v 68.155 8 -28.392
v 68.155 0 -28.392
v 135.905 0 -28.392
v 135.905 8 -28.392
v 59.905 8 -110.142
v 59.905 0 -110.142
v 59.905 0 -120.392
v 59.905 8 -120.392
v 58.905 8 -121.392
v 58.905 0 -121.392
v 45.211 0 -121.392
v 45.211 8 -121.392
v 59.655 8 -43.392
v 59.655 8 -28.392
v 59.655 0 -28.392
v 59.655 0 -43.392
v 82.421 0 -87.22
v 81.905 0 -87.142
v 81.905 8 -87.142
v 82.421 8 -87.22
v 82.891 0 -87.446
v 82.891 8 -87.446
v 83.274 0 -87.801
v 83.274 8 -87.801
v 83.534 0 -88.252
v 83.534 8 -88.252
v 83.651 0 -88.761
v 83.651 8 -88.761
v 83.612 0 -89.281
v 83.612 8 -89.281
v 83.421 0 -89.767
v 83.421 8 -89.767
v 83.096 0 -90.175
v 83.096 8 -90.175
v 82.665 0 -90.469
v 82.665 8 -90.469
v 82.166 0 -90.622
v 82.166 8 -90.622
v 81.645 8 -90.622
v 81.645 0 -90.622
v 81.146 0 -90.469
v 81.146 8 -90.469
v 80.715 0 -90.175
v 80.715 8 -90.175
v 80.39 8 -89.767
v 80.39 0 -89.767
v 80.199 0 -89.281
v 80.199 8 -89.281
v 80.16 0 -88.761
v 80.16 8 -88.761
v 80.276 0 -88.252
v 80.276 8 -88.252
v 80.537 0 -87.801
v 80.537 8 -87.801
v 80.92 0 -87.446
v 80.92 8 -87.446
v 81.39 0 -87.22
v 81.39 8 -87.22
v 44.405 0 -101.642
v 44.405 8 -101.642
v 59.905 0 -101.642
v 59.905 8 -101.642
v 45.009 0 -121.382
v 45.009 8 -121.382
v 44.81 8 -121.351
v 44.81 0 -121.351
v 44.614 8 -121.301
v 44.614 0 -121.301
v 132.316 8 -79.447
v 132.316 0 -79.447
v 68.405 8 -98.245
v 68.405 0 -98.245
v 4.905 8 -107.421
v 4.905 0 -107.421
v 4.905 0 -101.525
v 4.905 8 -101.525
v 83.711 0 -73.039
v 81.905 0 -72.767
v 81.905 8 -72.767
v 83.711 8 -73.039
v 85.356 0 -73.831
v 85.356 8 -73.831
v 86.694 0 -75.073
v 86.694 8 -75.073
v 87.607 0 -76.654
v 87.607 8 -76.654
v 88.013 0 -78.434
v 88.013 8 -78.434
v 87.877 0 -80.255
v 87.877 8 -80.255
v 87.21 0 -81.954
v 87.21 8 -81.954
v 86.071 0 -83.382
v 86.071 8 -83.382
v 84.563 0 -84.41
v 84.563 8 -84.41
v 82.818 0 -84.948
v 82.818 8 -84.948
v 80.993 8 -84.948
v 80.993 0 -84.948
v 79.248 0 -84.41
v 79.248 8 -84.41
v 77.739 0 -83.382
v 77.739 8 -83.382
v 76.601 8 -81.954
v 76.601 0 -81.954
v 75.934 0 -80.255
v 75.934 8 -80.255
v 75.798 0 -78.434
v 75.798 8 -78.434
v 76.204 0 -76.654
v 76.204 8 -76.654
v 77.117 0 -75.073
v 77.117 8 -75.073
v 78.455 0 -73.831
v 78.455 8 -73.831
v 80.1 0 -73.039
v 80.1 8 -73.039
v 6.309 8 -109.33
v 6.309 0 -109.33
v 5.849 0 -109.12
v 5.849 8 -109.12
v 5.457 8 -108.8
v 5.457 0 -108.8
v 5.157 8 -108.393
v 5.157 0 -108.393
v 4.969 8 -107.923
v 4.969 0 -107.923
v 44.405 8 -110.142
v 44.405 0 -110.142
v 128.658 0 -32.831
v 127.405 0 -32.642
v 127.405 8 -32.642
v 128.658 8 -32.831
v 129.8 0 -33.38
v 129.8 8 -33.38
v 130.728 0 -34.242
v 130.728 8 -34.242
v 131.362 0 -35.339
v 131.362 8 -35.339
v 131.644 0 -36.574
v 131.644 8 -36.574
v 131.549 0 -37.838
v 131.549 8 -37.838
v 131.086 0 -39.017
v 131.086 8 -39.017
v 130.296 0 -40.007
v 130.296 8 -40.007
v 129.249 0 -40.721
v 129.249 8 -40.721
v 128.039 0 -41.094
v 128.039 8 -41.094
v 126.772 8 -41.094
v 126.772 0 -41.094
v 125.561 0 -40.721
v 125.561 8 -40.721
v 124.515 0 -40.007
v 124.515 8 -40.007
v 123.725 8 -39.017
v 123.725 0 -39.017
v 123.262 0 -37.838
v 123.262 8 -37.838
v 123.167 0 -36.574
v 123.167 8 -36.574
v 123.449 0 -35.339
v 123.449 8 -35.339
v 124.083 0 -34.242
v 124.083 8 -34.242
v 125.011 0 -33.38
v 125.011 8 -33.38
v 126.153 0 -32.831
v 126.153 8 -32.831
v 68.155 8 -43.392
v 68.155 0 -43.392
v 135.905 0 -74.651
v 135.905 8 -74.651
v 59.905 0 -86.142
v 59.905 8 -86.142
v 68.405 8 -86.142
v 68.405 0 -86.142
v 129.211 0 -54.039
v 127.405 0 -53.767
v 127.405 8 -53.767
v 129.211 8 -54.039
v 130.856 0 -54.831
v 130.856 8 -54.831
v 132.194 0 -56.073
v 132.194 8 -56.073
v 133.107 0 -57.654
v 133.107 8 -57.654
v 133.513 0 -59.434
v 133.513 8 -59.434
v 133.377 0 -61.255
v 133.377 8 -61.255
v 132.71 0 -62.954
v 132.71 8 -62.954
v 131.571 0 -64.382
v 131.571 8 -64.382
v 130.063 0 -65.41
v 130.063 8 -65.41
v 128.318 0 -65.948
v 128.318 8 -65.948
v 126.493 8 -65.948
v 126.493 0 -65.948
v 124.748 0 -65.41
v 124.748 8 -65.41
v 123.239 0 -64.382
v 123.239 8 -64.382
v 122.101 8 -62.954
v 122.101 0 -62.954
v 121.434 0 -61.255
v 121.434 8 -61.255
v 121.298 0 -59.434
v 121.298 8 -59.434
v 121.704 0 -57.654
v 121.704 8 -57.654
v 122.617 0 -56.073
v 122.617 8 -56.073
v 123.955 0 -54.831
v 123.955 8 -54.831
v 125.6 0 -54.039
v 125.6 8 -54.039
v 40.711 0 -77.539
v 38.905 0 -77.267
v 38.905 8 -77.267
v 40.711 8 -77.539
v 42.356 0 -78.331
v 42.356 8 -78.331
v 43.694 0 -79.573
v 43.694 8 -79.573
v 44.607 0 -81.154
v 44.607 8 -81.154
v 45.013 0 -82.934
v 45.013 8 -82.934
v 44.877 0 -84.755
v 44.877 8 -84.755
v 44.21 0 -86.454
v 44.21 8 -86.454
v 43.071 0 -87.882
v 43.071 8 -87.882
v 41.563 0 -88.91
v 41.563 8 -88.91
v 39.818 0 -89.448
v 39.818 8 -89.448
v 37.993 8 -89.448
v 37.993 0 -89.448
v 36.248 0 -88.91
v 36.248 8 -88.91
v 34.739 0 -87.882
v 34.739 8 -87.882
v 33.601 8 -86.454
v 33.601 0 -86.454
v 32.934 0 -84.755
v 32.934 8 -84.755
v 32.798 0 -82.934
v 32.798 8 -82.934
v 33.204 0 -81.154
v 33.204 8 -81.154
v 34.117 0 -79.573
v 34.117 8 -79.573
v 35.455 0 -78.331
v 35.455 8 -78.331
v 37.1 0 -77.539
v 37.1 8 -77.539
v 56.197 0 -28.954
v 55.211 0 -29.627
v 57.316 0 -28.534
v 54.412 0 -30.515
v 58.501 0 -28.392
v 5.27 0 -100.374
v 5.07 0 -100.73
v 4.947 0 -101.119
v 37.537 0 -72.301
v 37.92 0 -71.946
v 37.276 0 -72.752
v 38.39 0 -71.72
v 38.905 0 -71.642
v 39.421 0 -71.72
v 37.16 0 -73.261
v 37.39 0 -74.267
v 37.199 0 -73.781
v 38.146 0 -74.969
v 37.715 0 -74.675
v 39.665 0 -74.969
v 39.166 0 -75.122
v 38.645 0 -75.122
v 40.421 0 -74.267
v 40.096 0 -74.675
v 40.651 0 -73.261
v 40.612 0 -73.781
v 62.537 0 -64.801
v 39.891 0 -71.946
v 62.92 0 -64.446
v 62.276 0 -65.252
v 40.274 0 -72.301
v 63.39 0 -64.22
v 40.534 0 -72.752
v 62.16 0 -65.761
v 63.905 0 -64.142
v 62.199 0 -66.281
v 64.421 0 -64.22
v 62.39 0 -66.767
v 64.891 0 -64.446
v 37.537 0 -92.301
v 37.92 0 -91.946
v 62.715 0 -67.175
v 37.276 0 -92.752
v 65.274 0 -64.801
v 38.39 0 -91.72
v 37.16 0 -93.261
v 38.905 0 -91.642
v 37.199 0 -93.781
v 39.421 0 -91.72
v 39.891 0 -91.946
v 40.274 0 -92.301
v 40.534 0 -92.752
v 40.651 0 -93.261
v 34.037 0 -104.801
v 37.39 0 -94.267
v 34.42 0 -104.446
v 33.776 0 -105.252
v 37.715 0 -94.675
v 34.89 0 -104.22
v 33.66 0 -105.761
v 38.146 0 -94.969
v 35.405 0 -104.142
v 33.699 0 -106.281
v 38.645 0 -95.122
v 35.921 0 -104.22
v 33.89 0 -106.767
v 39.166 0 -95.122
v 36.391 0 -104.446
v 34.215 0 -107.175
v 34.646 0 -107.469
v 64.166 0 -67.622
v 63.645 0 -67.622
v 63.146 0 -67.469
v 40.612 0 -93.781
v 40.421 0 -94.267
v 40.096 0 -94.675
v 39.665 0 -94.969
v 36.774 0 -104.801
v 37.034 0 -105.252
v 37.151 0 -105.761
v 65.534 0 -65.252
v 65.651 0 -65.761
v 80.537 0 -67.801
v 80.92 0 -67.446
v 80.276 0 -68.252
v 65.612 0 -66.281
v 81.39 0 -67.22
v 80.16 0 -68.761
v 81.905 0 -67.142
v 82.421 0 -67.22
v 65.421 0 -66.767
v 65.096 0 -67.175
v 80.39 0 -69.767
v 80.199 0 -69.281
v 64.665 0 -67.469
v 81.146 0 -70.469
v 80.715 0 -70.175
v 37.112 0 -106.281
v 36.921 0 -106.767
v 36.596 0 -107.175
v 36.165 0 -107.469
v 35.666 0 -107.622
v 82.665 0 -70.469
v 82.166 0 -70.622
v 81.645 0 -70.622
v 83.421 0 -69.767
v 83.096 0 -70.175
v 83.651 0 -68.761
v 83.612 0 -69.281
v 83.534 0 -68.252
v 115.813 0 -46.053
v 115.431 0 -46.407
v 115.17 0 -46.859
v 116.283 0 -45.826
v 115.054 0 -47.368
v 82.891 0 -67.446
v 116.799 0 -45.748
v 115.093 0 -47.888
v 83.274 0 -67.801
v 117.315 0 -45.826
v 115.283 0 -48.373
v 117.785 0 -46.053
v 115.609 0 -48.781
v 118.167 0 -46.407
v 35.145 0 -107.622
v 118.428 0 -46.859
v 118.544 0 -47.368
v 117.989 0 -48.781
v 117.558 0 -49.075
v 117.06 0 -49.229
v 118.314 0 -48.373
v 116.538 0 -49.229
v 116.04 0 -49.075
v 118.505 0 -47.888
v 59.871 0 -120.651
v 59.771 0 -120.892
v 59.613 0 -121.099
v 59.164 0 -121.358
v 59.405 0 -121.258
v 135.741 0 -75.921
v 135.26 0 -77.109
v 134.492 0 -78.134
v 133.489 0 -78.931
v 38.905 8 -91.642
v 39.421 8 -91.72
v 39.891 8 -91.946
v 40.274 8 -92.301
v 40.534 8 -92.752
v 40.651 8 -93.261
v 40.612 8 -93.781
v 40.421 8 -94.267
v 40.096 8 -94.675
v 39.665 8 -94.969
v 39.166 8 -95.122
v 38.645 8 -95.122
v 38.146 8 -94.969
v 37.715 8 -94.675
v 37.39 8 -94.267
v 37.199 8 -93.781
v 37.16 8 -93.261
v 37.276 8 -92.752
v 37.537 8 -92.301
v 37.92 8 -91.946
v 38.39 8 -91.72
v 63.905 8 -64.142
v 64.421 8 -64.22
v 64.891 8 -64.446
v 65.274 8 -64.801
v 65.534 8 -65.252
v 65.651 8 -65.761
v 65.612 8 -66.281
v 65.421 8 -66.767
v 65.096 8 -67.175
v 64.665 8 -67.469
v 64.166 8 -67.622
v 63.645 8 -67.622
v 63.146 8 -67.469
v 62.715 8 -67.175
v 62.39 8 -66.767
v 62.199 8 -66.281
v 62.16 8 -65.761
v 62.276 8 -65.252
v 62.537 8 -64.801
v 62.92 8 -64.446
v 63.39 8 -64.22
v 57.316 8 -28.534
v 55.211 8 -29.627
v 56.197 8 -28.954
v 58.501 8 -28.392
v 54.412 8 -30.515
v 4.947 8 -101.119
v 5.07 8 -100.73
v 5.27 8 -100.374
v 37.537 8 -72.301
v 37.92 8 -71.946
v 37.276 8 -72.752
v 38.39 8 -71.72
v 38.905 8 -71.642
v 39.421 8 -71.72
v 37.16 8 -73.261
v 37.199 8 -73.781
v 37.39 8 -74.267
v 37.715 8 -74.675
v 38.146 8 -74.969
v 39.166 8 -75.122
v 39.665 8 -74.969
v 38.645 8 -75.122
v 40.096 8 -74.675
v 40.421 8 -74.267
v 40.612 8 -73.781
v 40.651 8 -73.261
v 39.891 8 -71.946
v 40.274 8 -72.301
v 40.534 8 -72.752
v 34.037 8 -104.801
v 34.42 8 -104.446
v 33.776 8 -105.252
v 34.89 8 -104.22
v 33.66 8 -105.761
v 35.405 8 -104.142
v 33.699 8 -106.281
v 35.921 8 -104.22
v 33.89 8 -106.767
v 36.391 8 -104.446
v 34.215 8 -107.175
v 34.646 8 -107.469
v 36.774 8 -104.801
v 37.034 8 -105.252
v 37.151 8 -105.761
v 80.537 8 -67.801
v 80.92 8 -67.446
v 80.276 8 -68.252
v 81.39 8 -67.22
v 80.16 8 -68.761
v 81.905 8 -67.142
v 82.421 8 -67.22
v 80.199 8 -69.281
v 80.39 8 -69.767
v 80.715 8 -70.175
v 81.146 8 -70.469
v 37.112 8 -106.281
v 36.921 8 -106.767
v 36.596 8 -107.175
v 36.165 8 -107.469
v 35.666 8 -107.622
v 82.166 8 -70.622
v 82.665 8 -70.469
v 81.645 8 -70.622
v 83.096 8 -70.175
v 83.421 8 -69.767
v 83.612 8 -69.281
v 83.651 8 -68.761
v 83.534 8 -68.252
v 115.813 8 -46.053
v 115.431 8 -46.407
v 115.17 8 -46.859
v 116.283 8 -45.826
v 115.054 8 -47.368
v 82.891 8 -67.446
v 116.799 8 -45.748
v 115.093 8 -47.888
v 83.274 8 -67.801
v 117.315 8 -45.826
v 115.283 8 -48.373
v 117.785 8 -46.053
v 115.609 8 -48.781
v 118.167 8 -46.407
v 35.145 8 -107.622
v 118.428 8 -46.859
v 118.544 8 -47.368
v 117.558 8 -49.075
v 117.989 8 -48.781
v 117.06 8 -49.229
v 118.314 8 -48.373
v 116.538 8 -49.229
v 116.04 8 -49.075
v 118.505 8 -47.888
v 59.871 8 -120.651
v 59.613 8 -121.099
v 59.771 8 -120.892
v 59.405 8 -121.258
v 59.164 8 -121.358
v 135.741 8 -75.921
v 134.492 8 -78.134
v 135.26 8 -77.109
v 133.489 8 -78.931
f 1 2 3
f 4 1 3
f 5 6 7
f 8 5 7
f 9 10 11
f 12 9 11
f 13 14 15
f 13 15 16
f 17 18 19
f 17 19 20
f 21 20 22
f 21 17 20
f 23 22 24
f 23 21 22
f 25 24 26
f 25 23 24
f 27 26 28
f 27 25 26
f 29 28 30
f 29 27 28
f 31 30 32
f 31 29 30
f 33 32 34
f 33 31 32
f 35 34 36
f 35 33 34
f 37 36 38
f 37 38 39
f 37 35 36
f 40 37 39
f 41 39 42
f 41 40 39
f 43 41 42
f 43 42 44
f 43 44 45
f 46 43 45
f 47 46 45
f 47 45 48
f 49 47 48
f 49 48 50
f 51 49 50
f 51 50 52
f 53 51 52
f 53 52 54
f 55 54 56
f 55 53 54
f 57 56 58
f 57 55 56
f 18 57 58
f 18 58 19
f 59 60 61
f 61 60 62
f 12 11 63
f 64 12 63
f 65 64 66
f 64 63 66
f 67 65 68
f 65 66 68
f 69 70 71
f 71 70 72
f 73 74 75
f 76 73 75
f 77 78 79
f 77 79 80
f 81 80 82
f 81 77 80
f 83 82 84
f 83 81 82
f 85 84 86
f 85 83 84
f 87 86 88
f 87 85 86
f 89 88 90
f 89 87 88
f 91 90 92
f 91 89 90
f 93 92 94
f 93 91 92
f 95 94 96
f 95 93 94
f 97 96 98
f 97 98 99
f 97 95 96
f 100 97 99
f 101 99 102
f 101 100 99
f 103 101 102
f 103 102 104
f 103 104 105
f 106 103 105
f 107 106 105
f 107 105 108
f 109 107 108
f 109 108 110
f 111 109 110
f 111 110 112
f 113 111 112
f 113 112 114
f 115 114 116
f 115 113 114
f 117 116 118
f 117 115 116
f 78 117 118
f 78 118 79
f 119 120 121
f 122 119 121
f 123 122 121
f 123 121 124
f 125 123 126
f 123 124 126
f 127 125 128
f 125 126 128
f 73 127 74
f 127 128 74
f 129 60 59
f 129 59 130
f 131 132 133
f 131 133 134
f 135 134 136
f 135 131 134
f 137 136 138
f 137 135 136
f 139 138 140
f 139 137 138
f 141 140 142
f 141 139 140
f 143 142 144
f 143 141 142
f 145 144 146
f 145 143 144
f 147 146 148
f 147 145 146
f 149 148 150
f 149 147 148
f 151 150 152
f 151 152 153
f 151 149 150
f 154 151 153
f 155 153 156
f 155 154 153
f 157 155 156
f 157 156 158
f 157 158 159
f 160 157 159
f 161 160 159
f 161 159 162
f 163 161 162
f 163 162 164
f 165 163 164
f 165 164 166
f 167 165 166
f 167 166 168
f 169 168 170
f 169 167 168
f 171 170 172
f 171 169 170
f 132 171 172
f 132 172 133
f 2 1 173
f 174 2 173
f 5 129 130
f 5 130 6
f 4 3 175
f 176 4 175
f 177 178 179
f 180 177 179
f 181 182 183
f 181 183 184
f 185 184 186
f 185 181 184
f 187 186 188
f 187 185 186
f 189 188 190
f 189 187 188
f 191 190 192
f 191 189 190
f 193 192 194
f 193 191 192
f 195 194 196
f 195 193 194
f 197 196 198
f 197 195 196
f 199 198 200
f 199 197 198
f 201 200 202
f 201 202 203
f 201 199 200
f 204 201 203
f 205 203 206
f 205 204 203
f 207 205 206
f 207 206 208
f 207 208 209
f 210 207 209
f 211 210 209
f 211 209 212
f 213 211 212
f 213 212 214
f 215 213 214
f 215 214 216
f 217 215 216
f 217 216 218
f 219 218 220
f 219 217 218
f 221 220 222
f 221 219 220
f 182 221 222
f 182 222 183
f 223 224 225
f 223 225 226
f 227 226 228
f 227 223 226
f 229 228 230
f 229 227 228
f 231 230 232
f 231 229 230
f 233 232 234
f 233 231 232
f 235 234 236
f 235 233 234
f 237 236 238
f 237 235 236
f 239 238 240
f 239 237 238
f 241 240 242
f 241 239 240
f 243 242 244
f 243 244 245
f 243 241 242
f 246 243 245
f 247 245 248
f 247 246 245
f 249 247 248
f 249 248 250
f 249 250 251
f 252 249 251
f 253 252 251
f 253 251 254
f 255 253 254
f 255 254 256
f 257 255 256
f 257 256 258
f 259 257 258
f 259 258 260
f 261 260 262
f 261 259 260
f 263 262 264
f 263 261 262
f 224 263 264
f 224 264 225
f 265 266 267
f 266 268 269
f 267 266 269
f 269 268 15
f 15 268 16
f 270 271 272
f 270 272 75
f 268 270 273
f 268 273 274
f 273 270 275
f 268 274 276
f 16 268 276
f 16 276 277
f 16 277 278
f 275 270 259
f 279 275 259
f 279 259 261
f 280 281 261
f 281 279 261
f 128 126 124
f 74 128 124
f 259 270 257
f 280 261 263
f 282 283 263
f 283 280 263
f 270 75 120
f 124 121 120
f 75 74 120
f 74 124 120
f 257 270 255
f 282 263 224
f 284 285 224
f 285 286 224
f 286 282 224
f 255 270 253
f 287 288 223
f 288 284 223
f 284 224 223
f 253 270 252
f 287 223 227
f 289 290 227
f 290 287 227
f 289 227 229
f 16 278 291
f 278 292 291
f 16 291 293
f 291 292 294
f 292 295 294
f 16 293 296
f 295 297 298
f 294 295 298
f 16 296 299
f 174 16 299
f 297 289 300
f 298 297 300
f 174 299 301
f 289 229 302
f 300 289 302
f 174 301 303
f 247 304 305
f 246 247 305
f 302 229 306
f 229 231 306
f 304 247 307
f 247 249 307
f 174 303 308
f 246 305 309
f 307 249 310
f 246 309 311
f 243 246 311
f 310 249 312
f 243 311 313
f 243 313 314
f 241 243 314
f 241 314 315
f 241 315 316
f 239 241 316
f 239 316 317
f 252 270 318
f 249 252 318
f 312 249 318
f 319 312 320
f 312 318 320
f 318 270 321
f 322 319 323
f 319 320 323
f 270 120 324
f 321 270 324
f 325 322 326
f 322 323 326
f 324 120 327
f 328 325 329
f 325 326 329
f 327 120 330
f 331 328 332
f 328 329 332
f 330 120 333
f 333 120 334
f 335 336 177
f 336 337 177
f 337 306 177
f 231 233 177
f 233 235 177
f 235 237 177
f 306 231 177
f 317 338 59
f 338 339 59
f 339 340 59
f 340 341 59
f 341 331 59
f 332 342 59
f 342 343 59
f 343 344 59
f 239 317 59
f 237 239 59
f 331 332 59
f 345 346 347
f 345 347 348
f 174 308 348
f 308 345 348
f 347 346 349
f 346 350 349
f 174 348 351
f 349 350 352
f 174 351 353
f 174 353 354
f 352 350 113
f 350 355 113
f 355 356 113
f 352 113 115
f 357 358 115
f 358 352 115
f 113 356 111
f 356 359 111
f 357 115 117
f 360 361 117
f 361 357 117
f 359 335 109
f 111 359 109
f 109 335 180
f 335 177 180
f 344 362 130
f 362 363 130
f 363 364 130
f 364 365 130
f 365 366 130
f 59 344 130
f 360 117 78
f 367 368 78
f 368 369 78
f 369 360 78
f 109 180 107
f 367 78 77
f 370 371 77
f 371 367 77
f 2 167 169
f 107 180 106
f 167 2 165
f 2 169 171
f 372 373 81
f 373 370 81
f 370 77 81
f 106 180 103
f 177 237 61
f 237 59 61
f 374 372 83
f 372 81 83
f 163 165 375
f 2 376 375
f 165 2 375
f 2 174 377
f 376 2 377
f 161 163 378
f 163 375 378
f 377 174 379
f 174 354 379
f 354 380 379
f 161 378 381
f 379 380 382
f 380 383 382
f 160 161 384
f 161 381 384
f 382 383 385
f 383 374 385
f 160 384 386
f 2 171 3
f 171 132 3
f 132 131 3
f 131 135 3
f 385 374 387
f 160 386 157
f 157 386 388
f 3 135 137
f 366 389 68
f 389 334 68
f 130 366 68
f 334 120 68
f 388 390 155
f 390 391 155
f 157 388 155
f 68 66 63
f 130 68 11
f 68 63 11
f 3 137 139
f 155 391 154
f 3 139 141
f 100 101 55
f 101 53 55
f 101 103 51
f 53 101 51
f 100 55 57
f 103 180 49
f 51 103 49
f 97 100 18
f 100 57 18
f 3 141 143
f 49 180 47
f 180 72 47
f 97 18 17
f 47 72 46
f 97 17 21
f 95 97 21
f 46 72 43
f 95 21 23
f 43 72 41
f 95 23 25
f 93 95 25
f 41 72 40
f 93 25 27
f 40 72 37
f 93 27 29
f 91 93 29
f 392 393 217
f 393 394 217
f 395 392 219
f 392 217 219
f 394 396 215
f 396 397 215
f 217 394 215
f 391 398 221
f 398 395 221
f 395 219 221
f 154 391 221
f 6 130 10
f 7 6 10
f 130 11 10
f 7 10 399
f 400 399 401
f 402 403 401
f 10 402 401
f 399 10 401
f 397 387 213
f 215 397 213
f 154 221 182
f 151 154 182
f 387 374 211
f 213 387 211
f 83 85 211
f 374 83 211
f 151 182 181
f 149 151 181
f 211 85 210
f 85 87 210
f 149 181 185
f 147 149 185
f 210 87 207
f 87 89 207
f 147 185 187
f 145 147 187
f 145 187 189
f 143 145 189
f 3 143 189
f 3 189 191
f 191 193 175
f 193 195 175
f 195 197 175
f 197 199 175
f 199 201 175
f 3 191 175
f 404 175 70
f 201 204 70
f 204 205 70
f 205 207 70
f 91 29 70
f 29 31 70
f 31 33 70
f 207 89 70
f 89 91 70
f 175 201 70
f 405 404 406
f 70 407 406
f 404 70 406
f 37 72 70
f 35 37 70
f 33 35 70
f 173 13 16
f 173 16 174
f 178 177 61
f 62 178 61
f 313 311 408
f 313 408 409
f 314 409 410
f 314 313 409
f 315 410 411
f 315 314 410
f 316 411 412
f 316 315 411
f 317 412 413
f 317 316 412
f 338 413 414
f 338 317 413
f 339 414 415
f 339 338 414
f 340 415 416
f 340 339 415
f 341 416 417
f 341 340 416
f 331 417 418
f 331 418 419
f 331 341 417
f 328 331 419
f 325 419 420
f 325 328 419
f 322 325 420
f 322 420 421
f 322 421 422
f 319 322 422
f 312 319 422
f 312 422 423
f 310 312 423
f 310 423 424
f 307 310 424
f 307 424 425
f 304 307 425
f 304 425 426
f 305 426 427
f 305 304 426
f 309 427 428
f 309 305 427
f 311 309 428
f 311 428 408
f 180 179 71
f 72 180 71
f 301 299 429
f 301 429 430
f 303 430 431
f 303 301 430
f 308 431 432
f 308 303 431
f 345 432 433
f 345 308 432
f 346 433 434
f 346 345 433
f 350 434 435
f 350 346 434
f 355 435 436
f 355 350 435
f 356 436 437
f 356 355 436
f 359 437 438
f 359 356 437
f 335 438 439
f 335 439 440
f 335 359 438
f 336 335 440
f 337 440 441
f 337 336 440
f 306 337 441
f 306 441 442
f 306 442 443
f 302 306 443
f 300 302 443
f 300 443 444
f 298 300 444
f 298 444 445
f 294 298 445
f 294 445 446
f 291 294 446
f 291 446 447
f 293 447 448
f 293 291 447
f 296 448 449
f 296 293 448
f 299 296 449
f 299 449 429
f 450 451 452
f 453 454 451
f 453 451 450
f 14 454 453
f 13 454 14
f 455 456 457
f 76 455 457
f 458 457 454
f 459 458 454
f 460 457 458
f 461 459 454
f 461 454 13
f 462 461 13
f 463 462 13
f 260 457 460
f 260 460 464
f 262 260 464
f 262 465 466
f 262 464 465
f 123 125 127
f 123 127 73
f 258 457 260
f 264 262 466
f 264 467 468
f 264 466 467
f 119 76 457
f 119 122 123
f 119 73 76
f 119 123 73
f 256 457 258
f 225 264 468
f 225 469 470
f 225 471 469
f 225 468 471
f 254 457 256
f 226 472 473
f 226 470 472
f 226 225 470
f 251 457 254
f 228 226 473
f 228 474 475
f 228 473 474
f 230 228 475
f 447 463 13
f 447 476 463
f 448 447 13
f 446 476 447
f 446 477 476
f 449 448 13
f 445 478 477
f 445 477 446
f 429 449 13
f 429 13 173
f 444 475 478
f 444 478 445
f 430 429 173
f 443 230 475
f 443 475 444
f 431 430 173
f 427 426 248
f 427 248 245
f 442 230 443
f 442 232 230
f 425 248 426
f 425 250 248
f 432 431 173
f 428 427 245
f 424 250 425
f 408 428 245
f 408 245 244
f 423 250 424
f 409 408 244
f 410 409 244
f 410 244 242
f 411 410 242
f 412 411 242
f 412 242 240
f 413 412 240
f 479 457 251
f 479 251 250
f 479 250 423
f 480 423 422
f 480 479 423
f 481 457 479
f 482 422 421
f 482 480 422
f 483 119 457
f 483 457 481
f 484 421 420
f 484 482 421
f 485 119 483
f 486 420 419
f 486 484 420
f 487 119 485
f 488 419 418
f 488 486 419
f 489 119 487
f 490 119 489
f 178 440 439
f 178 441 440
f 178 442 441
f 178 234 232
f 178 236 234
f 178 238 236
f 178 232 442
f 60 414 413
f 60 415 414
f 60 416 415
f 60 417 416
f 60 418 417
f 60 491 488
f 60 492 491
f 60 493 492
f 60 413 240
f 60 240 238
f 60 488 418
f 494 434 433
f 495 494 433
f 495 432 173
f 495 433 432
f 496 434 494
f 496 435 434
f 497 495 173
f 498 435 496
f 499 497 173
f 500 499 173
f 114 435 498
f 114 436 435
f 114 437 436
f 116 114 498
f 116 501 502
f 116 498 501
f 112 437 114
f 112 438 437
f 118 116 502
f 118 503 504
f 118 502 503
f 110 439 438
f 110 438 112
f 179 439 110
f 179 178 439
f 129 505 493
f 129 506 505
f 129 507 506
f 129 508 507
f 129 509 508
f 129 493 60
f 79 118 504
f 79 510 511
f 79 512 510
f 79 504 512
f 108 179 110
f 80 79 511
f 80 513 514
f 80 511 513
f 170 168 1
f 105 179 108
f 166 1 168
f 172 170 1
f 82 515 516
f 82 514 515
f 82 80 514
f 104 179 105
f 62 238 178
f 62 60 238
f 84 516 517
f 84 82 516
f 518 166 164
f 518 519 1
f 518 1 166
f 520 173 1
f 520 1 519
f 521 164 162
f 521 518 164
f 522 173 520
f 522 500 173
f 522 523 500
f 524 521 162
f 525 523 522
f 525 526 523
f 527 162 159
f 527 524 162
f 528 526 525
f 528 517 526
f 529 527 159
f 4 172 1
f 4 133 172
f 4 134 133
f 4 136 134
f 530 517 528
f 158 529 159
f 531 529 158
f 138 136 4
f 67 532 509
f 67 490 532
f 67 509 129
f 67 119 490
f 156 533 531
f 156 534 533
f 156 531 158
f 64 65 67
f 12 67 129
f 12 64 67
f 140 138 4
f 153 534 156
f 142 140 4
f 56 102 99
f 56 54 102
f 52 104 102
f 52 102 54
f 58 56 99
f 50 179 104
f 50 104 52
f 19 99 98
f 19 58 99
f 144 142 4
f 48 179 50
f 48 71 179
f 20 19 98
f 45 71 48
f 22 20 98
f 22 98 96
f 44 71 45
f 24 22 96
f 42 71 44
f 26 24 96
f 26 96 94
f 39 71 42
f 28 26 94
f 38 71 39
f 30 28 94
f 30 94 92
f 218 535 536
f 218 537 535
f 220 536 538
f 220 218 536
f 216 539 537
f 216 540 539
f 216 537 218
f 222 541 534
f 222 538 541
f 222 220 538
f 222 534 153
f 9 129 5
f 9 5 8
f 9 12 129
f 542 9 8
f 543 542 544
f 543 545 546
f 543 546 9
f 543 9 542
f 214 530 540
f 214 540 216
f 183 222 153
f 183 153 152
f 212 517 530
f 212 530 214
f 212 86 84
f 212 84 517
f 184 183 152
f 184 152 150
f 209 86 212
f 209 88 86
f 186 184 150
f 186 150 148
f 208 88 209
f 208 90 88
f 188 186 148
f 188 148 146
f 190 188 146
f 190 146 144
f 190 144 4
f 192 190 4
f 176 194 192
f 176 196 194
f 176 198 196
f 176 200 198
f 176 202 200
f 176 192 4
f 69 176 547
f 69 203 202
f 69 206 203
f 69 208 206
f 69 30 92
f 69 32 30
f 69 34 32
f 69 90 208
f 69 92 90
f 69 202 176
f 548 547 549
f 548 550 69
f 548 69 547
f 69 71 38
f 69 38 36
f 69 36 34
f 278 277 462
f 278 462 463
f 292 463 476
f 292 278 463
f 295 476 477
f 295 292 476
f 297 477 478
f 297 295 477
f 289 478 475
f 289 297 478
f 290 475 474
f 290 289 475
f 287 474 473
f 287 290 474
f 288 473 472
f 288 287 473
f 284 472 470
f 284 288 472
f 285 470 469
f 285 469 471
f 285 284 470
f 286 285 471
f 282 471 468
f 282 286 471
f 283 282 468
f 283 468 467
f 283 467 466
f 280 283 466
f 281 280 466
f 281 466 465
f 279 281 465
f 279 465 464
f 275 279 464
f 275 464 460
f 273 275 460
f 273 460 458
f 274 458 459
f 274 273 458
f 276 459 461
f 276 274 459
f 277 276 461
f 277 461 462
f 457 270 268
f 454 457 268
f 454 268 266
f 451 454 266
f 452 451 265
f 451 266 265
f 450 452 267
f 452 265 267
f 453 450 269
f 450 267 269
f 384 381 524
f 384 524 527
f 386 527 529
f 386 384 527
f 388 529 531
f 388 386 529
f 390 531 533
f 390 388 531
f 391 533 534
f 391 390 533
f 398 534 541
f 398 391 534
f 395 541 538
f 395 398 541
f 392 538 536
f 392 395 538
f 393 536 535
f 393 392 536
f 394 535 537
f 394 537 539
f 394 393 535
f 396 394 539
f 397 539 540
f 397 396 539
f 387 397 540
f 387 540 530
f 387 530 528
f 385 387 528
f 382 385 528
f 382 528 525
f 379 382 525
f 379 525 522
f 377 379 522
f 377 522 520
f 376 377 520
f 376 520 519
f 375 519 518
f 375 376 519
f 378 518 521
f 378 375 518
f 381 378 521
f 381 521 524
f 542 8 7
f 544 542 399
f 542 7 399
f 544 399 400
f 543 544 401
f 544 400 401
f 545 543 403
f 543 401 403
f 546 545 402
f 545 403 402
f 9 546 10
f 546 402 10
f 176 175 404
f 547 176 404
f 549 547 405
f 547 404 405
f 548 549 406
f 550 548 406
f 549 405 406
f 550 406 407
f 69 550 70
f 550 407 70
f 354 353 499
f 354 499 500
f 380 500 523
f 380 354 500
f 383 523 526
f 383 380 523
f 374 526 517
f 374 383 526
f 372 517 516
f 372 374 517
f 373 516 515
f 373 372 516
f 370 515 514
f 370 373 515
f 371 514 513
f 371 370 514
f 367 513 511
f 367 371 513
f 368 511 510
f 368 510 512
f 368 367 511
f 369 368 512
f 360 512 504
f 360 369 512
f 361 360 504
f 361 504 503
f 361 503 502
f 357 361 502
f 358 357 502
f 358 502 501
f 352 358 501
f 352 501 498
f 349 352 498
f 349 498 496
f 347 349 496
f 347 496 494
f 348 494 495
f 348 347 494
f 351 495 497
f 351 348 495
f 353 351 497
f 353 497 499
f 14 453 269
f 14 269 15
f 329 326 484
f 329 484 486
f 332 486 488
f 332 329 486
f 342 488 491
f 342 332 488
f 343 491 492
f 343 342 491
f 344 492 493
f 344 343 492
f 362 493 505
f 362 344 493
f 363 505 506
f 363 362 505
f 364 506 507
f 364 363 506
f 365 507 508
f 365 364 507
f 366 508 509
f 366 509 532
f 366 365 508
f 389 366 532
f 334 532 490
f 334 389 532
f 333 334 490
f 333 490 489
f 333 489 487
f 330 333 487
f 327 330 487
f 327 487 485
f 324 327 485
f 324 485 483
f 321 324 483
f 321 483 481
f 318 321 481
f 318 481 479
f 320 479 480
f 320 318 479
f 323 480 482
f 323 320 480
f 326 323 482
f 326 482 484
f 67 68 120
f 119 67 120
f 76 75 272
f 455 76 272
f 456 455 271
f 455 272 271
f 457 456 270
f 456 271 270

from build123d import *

# Parameters (mm, degrees)
SKETCH1_R      = 6.125
SKETCH1_R_2    = 4.25
SKETCH1_R_3    = 1.75
EXTRUDE1_DEPTH = 8
SKETCH3_W      = 8.5
SKETCH3_H      = 15
SKETCH3_W_2    = 15.5
SKETCH3_H_2    = 8.5
SKETCH3_H_3    = 15.5
EXTRUDE2_DEPTH = 10


with BuildPart() as part:
    # Sketch1 → Extrude1 (new body)
    with BuildSketch(Plane(origin=(0, 0, 0), x_dir=(1, 0, 0), z_dir=(0, 1, 0))):
        with BuildLine():
            Line((135.905429433, 28.391828159), (135.905429433, 74.65063841))
            ThreePointArc((135.905429433, 74.65063841), (134.908812883, 77.646121835), (132.316261053, 79.447465917))
            Line((132.316261053, 79.447465917), (67.905429433, 98.391828159))
            Line((67.905429433, 98.391828159), (59.905429433, 100.744769335))
            Line((59.905429433, 100.744769335), (59.905429433, 109.891828159))
            Line((59.905429433, 109.891828159), (59.905429433, 120.391828159))
            ThreePointArc((59.905429433, 120.391828159), (59.612536214, 121.09893494), (58.905429433, 121.391828159))
            Line((58.905429433, 121.391828159), (45.210651279, 121.391828159))
            ThreePointArc((45.210651279, 121.391828159), (44.908922851, 121.368937148), (44.614101292, 121.300788115))
            Line((44.614101292, 121.300788115), (6.308879447, 109.330406288))
            ThreePointArc((6.308879447, 109.330406288), (5.294048042, 108.606119288), (4.905429433, 107.421446332))
            Line((4.905429433, 107.421446332), (4.905429433, 101.524813665))
            ThreePointArc((4.905429433, 101.524813665), (4.998649565, 100.921331655), (5.269619969, 100.374106318))
            Line((5.269619969, 100.374106318), (54.411845802, 30.515059791))
            ThreePointArc((54.411845802, 30.515059791), (56.197442578, 28.954270168), (58.501369461, 28.391828159))
            Line((58.501369461, 28.391828159), (59.905429433, 28.391828159))
            Line((59.905429433, 28.391828159), (67.905429433, 28.391828159))
            Line((67.905429433, 28.391828159), (135.905429433, 28.391828159))
        make_face()
        with Locations(Location((127.405429433, 59.891828159, 0), (0, 0, 270))):
            Circle(SKETCH1_R, mode=Mode.SUBTRACT)
        with Locations(Location((127.405429433, 36.891828159, 0), (0, 0, 270))):
            Circle(SKETCH1_R_2, mode=Mode.SUBTRACT)
        with Locations(Location((116.798827433, 47.498429876, 0), (0, 0, 270))):
            Circle(SKETCH1_R_3, mode=Mode.SUBTRACT)
        with Locations(Location((81.905429433, 78.891828159, 0), (0, 0, 270))):
            Circle(SKETCH1_R, mode=Mode.SUBTRACT)
        with Locations(Location((81.905429433, 88.891828159, 0), (0, 0, 270))):
            Circle(SKETCH1_R_3, mode=Mode.SUBTRACT)
        with Locations(Location((81.905429433, 68.891828159, 0), (0, 0, 270))):
            Circle(SKETCH1_R_3, mode=Mode.SUBTRACT)
        with Locations(Location((38.905429433, 83.391828159, 0), (0, 0, 270))):
            Circle(SKETCH1_R, mode=Mode.SUBTRACT)
        with Locations(Location((38.905429433, 93.391828159, 0), (0, 0, 270))):
            Circle(SKETCH1_R_3, mode=Mode.SUBTRACT)
        with Locations(Location((38.905429433, 73.391828159, 0), (0, 0, 270))):
            Circle(SKETCH1_R_3, mode=Mode.SUBTRACT)
        with Locations(Location((35.405429433, 105.891828159, 0), (0, 0, 270))):
            Circle(SKETCH1_R_3, mode=Mode.SUBTRACT)
        with Locations(Location((63.905429433, 65.891828159, 0), (0, 0, 270))):
            Circle(SKETCH1_R_3, mode=Mode.SUBTRACT)
    extrude(amount=EXTRUDE1_DEPTH)

    # Sketch3 → Extrude2 (cut)
    with BuildSketch(Plane(origin=(0, 8, 0), x_dir=(1, 0, 0), z_dir=(0, 1, 0))):
        with Locations((63.905429433, 35.891828159)):
            Rectangle(SKETCH3_W, SKETCH3_H)
        with Locations((52.155429433, 105.891828159)):
            Rectangle(SKETCH3_W_2, SKETCH3_H_2)
        with Locations((64.155429433, 93.891828159)):
            Rectangle(SKETCH3_W, SKETCH3_H_3)
    extrude(amount=-EXTRUDE2_DEPTH, mode=Mode.SUBTRACT)


solid = part.part
